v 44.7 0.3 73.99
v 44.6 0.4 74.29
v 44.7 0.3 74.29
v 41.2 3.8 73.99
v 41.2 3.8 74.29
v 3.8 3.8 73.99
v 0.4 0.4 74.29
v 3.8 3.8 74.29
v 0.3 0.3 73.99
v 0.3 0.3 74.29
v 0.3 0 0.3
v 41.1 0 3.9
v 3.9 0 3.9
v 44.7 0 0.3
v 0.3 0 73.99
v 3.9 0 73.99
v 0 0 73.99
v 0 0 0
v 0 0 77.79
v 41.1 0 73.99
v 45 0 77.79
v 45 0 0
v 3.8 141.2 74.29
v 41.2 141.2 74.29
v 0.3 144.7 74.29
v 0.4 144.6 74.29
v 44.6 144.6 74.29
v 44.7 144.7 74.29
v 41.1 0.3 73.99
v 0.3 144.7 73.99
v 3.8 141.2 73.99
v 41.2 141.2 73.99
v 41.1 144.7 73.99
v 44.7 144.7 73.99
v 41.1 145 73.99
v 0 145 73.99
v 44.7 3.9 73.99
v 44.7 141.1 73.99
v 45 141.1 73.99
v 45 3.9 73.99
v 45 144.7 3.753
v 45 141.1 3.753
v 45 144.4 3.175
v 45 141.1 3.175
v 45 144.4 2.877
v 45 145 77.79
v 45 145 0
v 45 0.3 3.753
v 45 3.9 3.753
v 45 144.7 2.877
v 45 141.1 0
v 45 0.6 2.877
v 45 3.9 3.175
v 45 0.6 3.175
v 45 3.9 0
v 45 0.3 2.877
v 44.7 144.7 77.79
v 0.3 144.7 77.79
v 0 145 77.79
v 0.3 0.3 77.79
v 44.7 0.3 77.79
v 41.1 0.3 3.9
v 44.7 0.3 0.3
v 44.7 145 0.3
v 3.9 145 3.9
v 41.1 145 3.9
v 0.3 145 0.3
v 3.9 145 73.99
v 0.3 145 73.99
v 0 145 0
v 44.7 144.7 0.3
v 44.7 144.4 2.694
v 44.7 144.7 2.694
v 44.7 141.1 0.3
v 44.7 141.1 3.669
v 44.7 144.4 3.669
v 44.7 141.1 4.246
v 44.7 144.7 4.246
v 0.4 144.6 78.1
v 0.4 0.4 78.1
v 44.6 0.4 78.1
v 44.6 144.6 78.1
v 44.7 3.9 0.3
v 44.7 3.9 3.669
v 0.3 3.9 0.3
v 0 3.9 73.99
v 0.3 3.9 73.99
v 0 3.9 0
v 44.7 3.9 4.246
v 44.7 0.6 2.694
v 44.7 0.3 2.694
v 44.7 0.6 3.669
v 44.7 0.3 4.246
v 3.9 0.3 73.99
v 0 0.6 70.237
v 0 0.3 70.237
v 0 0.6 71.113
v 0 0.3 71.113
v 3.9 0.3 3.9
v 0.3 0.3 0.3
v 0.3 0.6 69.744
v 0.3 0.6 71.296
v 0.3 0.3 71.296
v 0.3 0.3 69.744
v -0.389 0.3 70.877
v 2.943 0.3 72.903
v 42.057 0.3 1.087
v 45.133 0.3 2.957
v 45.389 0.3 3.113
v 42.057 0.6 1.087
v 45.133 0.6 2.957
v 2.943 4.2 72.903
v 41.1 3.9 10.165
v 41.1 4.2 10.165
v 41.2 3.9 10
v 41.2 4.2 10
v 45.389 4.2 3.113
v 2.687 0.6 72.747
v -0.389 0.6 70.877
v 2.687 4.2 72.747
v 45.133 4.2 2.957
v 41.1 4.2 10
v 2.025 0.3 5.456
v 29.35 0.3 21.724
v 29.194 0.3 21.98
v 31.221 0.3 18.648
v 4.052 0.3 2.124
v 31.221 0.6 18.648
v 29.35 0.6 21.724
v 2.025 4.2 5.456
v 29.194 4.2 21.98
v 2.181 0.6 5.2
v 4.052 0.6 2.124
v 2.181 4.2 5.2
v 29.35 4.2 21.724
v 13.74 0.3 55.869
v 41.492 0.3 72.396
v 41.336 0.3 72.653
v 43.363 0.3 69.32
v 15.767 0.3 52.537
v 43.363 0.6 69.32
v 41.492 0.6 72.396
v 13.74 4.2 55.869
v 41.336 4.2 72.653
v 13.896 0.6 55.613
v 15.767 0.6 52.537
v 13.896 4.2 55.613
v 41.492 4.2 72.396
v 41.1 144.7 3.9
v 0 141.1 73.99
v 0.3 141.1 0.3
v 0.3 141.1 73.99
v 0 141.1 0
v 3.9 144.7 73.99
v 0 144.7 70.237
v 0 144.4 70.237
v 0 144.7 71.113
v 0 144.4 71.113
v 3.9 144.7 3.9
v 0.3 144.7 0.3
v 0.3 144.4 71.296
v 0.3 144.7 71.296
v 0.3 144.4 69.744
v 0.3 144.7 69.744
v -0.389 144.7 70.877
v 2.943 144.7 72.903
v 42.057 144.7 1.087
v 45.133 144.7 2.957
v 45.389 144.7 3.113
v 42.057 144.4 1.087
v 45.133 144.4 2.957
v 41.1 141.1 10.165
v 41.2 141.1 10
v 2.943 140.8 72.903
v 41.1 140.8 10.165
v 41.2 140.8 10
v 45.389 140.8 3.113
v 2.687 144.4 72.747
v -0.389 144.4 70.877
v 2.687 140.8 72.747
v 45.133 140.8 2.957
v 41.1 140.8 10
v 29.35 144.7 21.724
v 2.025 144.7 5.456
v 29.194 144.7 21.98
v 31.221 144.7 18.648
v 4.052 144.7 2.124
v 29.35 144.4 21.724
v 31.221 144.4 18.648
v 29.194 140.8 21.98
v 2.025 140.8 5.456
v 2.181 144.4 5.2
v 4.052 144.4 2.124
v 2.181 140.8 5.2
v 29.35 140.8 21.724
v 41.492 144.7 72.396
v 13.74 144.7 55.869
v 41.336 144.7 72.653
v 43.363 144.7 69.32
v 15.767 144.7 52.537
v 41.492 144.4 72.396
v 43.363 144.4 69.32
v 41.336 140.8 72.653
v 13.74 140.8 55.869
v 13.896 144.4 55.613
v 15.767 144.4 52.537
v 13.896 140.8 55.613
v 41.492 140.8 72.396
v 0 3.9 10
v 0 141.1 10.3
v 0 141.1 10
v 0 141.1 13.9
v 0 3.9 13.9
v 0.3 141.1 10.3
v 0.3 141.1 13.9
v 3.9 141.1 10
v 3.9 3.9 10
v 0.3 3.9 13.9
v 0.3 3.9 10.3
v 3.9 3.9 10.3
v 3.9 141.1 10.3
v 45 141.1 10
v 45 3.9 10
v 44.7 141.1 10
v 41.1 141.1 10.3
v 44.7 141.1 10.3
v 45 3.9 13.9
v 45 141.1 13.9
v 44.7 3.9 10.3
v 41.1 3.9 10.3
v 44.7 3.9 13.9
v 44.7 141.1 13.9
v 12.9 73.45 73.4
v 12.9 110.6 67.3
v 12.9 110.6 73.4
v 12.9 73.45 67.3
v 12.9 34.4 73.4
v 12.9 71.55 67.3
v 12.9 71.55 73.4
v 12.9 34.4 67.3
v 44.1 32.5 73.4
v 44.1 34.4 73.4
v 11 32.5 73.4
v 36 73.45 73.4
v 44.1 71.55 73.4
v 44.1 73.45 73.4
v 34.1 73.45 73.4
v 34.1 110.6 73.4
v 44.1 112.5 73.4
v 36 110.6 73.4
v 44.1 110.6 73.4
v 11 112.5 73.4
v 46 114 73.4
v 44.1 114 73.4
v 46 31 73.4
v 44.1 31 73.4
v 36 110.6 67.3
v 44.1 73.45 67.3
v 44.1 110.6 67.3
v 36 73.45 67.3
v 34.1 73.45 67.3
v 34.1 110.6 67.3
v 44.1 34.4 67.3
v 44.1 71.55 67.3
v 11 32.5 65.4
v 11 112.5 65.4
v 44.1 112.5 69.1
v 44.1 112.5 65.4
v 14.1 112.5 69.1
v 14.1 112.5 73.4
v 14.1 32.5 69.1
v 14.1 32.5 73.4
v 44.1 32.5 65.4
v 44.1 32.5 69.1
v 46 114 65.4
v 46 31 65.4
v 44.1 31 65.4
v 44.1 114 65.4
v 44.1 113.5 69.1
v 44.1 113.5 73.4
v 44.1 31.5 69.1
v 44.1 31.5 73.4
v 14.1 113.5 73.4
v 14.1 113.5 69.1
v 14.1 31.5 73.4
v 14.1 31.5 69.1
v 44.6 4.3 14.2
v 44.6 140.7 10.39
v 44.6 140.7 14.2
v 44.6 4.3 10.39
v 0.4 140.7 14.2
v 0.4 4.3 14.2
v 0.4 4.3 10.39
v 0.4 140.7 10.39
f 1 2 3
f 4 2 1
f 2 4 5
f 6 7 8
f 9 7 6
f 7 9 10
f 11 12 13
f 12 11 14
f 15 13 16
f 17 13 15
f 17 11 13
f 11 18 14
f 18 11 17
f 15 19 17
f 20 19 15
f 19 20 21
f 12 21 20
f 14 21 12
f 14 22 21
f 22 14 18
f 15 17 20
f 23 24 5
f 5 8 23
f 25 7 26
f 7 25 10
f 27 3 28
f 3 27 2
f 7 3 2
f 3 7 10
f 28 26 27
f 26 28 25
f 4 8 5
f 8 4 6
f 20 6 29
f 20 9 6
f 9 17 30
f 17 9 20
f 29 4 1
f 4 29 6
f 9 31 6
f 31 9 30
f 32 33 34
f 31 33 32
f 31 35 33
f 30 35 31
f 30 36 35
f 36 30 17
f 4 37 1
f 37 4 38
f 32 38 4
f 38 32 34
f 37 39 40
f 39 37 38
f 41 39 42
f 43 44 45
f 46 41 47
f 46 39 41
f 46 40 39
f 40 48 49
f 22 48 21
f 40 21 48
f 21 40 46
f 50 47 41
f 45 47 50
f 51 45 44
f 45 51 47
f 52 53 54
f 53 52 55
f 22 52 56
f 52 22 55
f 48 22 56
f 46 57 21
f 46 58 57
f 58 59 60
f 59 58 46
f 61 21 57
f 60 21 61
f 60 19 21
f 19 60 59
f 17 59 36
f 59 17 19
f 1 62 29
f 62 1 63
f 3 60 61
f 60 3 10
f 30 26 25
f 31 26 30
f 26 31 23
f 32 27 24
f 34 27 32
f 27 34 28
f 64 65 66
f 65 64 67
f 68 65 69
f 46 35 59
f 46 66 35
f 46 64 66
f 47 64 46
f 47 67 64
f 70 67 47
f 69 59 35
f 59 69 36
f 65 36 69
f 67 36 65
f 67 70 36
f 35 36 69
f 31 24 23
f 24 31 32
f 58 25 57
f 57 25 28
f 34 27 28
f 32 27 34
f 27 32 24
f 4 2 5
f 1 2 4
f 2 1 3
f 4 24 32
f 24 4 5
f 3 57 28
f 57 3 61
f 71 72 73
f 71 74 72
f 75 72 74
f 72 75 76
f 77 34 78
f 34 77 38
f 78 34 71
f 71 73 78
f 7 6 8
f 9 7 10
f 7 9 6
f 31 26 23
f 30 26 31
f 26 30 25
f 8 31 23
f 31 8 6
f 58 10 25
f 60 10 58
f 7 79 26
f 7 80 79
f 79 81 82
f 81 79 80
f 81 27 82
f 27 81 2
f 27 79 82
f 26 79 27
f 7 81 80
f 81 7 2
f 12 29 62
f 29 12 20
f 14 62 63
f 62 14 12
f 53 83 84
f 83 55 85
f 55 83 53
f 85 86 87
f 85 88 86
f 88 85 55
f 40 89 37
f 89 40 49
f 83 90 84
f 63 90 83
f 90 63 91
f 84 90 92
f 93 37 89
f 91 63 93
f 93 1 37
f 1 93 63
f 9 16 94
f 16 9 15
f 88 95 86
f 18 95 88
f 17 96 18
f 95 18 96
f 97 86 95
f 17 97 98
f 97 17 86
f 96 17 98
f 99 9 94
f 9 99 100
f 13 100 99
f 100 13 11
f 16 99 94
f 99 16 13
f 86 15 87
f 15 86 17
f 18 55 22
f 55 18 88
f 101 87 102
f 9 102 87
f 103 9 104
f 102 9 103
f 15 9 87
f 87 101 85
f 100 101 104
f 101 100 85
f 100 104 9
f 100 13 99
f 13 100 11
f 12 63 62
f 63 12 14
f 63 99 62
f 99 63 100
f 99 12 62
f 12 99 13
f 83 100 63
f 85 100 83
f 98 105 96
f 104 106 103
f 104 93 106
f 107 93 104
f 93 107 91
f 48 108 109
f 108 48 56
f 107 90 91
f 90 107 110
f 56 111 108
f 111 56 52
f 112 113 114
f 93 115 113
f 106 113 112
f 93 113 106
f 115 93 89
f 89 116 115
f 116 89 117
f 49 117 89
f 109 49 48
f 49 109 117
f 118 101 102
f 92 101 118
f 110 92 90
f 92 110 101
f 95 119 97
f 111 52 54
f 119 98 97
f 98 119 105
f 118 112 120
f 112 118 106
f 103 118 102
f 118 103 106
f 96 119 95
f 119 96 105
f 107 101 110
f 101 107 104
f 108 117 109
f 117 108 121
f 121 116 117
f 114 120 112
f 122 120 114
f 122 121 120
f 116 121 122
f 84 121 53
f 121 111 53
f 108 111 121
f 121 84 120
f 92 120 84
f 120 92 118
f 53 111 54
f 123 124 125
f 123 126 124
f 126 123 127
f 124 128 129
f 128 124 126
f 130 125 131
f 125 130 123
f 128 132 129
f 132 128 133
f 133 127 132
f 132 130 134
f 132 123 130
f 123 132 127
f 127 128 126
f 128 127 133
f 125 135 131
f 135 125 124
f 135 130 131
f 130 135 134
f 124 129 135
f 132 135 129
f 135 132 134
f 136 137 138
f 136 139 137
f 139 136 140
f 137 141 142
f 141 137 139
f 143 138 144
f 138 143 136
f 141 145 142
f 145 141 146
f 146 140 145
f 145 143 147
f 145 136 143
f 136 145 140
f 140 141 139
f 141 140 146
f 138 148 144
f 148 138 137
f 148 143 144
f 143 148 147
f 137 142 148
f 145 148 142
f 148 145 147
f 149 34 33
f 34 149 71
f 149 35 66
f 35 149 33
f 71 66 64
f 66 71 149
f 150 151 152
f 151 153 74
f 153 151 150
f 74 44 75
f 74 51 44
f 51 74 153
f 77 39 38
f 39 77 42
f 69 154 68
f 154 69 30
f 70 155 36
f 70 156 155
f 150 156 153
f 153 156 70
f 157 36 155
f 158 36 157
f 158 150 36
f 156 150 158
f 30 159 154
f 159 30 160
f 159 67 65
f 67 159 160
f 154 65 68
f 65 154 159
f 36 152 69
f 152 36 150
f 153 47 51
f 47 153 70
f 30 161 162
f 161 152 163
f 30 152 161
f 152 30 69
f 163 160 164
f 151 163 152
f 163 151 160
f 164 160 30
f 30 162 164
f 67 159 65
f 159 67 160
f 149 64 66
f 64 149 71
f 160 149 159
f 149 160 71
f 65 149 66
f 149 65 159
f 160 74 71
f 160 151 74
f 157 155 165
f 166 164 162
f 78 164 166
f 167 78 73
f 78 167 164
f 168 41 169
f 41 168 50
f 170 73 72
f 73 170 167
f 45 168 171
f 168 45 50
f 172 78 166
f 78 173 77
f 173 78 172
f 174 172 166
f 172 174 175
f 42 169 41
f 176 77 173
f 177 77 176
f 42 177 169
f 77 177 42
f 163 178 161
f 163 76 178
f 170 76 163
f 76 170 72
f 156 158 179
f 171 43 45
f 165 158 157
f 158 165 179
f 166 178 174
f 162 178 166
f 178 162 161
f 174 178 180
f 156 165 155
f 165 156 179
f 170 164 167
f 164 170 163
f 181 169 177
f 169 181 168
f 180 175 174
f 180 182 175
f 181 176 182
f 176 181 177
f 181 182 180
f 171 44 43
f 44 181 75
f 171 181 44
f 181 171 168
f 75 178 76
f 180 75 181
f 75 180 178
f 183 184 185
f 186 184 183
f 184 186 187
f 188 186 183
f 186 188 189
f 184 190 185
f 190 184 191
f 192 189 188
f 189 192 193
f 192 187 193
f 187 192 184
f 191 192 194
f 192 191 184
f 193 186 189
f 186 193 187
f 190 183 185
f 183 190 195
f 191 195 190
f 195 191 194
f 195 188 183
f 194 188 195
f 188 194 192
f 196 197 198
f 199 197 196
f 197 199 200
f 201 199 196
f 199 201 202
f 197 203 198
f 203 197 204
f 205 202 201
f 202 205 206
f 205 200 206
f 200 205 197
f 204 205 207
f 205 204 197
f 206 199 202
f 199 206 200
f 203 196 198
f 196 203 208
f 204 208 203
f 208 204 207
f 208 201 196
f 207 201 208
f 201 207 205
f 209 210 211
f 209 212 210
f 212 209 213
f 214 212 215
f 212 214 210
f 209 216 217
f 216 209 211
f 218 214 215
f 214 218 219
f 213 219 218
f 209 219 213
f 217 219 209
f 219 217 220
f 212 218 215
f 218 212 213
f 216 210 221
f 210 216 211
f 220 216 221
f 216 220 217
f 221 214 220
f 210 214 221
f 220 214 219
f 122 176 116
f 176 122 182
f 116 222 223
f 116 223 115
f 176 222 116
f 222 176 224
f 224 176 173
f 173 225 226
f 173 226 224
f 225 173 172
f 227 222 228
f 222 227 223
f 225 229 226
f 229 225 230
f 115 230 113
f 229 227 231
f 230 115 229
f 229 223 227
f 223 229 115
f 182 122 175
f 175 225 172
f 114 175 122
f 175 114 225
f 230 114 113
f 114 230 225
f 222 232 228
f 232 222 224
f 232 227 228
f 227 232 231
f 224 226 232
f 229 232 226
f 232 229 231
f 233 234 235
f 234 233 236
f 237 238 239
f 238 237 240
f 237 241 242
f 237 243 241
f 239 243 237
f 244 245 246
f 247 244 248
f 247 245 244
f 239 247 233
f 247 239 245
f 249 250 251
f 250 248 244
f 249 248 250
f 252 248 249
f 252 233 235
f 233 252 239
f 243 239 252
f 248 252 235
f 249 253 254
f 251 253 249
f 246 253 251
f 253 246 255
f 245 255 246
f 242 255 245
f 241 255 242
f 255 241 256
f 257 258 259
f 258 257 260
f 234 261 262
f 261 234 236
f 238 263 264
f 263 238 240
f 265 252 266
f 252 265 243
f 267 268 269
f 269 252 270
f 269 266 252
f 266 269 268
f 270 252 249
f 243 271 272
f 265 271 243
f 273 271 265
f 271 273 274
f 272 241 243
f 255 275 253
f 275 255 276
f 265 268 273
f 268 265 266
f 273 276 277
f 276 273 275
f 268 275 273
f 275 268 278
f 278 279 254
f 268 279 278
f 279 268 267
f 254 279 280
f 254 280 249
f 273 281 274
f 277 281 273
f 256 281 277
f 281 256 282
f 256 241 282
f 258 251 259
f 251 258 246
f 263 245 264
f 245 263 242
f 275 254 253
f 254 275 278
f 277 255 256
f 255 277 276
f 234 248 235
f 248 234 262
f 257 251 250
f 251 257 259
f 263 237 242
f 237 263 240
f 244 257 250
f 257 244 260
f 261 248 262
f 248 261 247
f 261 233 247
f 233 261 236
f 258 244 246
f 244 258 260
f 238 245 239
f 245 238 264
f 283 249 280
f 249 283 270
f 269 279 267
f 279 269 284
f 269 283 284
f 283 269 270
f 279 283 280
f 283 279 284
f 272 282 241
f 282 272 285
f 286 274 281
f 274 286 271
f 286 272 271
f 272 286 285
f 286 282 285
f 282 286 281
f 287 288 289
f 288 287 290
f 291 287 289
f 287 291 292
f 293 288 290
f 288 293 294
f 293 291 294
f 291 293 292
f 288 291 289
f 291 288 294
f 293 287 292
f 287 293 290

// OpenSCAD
// file: ../hdim.scad
module hdim(x1 = 10, x2 = 20, y = 10, dimline_lenght = 9.0) 
{
    dimline_overlap = 0.5;
    dimline_width = 0.3;
    text_size = 2;
    tmp = 2*dimline_overlap+text_size/2;
    text_pos = dimline_lenght>0 ? tmp : -tmp; 
    dimline_abs = dimline_lenght>0 ? dimline_lenght : -dimline_lenght;
    
    color([0,0,0])
    {
        translate([x1,y-dimline_lenght/2,0]) 
            square([dimline_width, 
                dimline_abs + 2*dimline_overlap], 
                center=true, $fs=0.01);
                
        translate([x2,y-dimline_lenght/2,0]) 
            square([dimline_width, 
                dimline_abs + 2*dimline_overlap], 
                center=true, $fs=0.01);

        translate([(x1+x2)/2,y-dimline_lenght,0]) 
            square([x2-x1, 
                dimline_width], 
                center=true, $fs=0.01);
    }
        
    translate([(x1+x2)/2,y-dimline_lenght-text_pos,0]) 
    {
        color([0,0,0])
        cube([text_size * 5, 1.2*text_size, 0.9], center=true);
        
        color([0.8,0.8,0.5,1.0])
        {
            translate([0,0,0.2])
            text(str(0.1*round((x2-x1)*10)), size = text_size, 
                halign = "center",valign = "center");
            translate([0,0,-0.2])
            rotate([0,180,0])
            text(str(0.1*round((x2-x1)*10)), size = text_size, 
                halign = "center",valign = "center");
        }
    }
}

hdim();
// file: printershelfdrawer.scad
use <../hdim.scad> 

box_l = 35; // Depth max 54
box_w = 80; 
box_h = 8;
plywood_t = 1.9;

slider_t = 1; // thickness
slider_w = 4.3; // width
slider_l = 30; // length
slider_m = slider_l; // movement

module printershelfdrawer(open = false)
{
  explode = false;
  final_view = false;
  
  edelta = explode ? 12 : 0;
  opaque10 = final_view ? 0 : 0.1;
    
  translate([open?slider_m:0,0,0])
  {  
    color([51/255, 34/255, 6/255, 1-opaque10]) 
    translate([-plywood_t/2,0,plywood_t/2])
    cube([box_l-plywood_t, box_w, plywood_t], center=true);
    
    if (!final_view) {
        hdim(-box_l/2, box_l/2-plywood_t, box_w/2, -2);
        rotate([0,0,90]) 
        hdim(-box_w/2, box_w/2, box_l/2, -5);
    }

    cover_over = 1.5;
    
    color([121/255, 44/255, 16/255, 1-2*opaque10]) {
        translate([-box_l/2+plywood_t/2-edelta,0,box_h/2+plywood_t/2])
        cube([plywood_t, box_w, box_h-plywood_t],
            center=true);
        
        translate([box_l/2-plywood_t/2+edelta,0,box_h/2])
        cube([plywood_t, box_w+2*cover_over, box_h],
            center=true); 
    }

    dim1 = (box_l - 2*plywood_t)/2;
    dim2 = (box_h - plywood_t)/2;
    dim3 = box_h/2;

    if (!final_view) {
        translate([0, -edelta, box_h/2+plywood_t/2]) 
        rotate([0,0,180]) 
        hdim(-dim1, dim1, box_w/2, -5);
        
        translate([0, -edelta-box_w/2+plywood_t/2,
            box_h/2+plywood_t/2]) 
        rotate([0,90,90]) 
        hdim(-dim2, dim2, -dim1, 5);
    }
    
    color([91/255, 78/255, 66/255, 1-2*opaque10]) {
        translate([0,box_w/2-plywood_t/2+edelta,
            box_h/2+plywood_t/2])
        cube([box_l - 2*plywood_t, plywood_t,
            box_h-plywood_t], center=true);
        
        translate([0,-box_w/2+plywood_t/2-edelta,
            box_h/2+plywood_t/2])
        cube([box_l - 2*plywood_t, plywood_t, 
            box_h-plywood_t], center=true);
    }
    
    if (!final_view) {
        translate([0,0,box_h/2+plywood_t/2])
        rotate([0,0,90]) 
        hdim(-box_w/2-cover_over, 
            box_w/2+cover_over, 
            -box_l/2-edelta, 7); 
        
        translate([edelta+box_l/2-plywood_t/2,
        0, box_h/2]) 
        rotate([0,90,-90]) hdim(-dim3, dim3, 0, -4);
    }
 
    main_divider_pos = 10;
    color([91/255, 44/255, 16/255, 1-2*opaque10]) 
    {
        ww = box_w/2 - 1.5 * plywood_t;
      translate([box_l/2 - plywood_t/2
        + edelta - main_divider_pos,
        ww/2+plywood_t/2,box_h/2+plywood_t/2])
      cube([plywood_t, ww, 
        box_h-plywood_t], center=true);
            
      translate([0,0,
            box_h/2+plywood_t/2])
      cube([box_l - 2*plywood_t, plywood_t, 
            box_h-plywood_t], center=true);

      }
    
    translate([-slider_l + box_l/2 - plywood_t, 
        box_w/2, box_h-slider_w]) 
    slider(open);
    
    translate([-slider_l + box_l/2 - plywood_t, 
        -box_w/2, box_h-slider_w]) 
    mirror([0,1,0]) 
    slider(open);
  }
}        

module slider(open = false)
{
    color([122/255, 162/255, 214/255, 1]) 
    cube([slider_l, slider_t/2, slider_w], center = false);

    translate([open?-slider_m:0,slider_t/2,0])
    color([192/255, 192/255, 255/255, 1]) 
    cube([slider_l, slider_t/2, slider_w], center = false);}



printershelfdrawer();
// file: tableleg.scad
use <../hdim.scad> 


bar_t  = 0.3;

module tableleg(height = 73.9, width = 56, bar_diam = 3.8, dimensions=true, explode=false, c1 = [0.5,0.28,0.19, 1.0], c2 = [0.8,0.30,0.29, 1.0])
{
    d = explode ? 20 : 0;
   
    
    translate([width,0,0])
    rotate([0,90,90])
    {
    translate([-height,-d,0]) 
    tl_anglebar(height, bar_diam, c1, straight1=true, dims=dimensions);
    translate([0,width+d,0]) 
    rotate([0,0,180])
    tl_anglebar(height, bar_diam, c1, straight2=true, dims=dimensions);
    translate([d,0,0]) 
    rotate([0,0,90])
    tl_anglebar(width, bar_diam, c2, dims=dimensions);
    angle = atan2(width, height);
    len = sqrt(width*width+height*height) - (bar_diam+bar_t)/cos(angle);
    translate([-height/2,width/2,bar_t]) 
    rotate([0,0,-angle])
    translate([-len/2,-bar_diam/2,0]) 
    tl_anglebar(len, bar_diam, c2, straight1=true, straight2=true, dims=dimensions);

    
    hyp = width - 1.41*bar_diam;
    angle2 = -angle+90;
    cat1 = sin(angle)*hyp;
    cat2 = cos(angle)*hyp;
    len2 = cat2 - bar_diam/2;
    
    dx = cat1*cos(angle);
    dy = cat1*sin(angle)+1.25*bar_diam/2;
    translate([-dx,dy,bar_t]) 
    rotate([0,0, angle2])
    translate([len2,4*bar_diam/3,0]) 
    rotate([0,0,180])
    tl_anglebar(len2, bar_diam, c2, straight1=true, straight2=true, dims=dimensions);

    dx2 = height-dx-bar_diam/2-bar_t;
    dy2 = width-dy-bar_diam/2+bar_t;
    translate([-dx2,dy2,bar_t]) 
    rotate([0,0, angle2])
    translate([0,bar_diam/2,0]) 
     rotate([0,0,180])
    tl_anglebar(len2+0.5,bar_diam, c2,straight1=true, straight2=true, dims=dimensions);
    }
}        

module tl_anglebar(height, bar_diam, c, straight1=false, straight2=false, dims=true)
{
   color(c)
    {
        linear_extrude(bar_t) 
        polygon(points=[[0,0],
            [straight1?0:bar_diam, bar_diam],
            [straight2?height:height-bar_diam, bar_diam],
            [height, 0], [0,0]]);
 
        cube([height, bar_t, bar_diam]);
    }
    
    if (dims) {
        hdim(x1 = 0, x2 = height, y = 0, dimline_lenght = 5);
    }
}   


tableleg();
// file: ../simpleplaywood.scad
module simpleplaywood(length=57, width = 210, spacing = 0.5, playwood_thickness = 0.75 * 2.54, c = [0.80,0.43,0.32]) 
{
    translate([length/2+spacing,width/2+spacing,-playwood_thickness/2])
    color(c)
    cube([length-2*spacing, width-2*spacing, playwood_thickness],center=true);
    
 
}

simpleplaywood();
// file: ../anglebarframe.scad
use <hdim.scad> 

bar_diam = 3.8;
bar_t  = 0.3;

module anglebarframe(length = 60, width = 210, explode=false, c1 = [0.5,0.28,0.19, 1.0], c2 = [0.8,0.30,0.29, 1.0])
{
    d = explode ? 20 : 0;
      
    rotate([0,180,0])
    {
    translate([-length,-d,0]) 
    anglebar(length, c1);
    translate([0,width+d,0]) 
    rotate([0,0,180])
    anglebar(length, c1);
    translate([d,0,0]) 
    rotate([0,0,90])
    anglebar(width, c2);
    translate([-length-d,width,0]) 
    rotate([0,0,-90])
    anglebar(width,c2);
    }
}        

module anglebar(length, c)
{
   color(c)
    {
        linear_extrude(bar_t) 
        polygon(points=[[0,0],
            [bar_diam, bar_diam],
            [length-bar_diam, bar_diam],
            [length, 0], [0,0]]);
 
        cube([length, bar_t, bar_diam]);
    }
}   


anglebarframe();
// main file
use <../anglebarframe.scad>
use <../simpleplaywood.scad>
use <tableleg.scad>
use <printershelfdrawer.scad>

playwood_thickness = 2 * 0.75 * 2.54;
bar_diam = 3.9;

c = [0.3,0.3,0.39, 1.0];
c2 = [0.3,0.30,0.50, 1.0];
   
plywood_c = [0.80,0.43,0.32, 0.7];

module printershelf(width = 145, depth = 45, height = 77.8, explode=false)
{
    anglebar_thickness = 0.3;
    playwood_allowance = 0.1 + anglebar_thickness; // Needs to include 0.3 mm for angle bar
 
    translate([depth,0,height-playwood_thickness])
    rotate([0,180,0])
    {
    anglebarframe(depth, width, explode, c, c2);
    
    translate([-playwood_allowance,-playwood_allowance,-anglebar_thickness])
    simpleplaywood(depth, width, playwood_allowance, playwood_thickness,plywood_c);
    }
    
    text_size = 4;
    row_step = 7;
    ystart = width - row_step;
    
    color([0.9,0.9,0.1,1.0])
    {
        t1 = "PRINTER SHELF"; 
        t2 = str(width, "cm x ", depth, "cm");
        t3 = "plywood size";
        t4 = str(width-2*playwood_allowance, " x ", depth-2*playwood_allowance);
     
        translate([depth/2,ystart,height]) 
        {
            text(t1, size = text_size, 
                halign = "center",valign = "top");
            translate([0, -8, 0]) 
                text(t2, size = text_size, 
                    halign = "center",valign = "top");
            translate([0, -width/2, 0]) 
                text(t3, size = text_size, 
                    halign = "center",valign = "top");
            translate([0, -width/2-8, 0]) 
                text(t4, size = text_size, 
                    halign = "center",valign = "top");
        }
    } 
    
    tableleg(height-playwood_thickness, depth, bar_diam, true, explode, c, c2);
    
    translate([0, width, 0])
    mirror([0,1,0])
    tableleg(height-playwood_thickness, depth, bar_diam, false, explode, c, c2);
    
    space_for_vacuum_cleaner = 10;
    translate([0, bar_diam, space_for_vacuum_cleaner])
    rotate([90,0,90])
    tl_anglebar(width-2*bar_diam, bar_diam, c, straight1=true, straight2=true); 

    translate([depth, bar_diam, space_for_vacuum_cleaner])
    rotate([0,0,90])
    tl_anglebar(width-2*bar_diam, bar_diam, c, straight1=true, straight2=true); 
    
    translate([-playwood_allowance,-playwood_allowance+bar_diam,anglebar_thickness+space_for_vacuum_cleaner+bar_diam])
    simpleplaywood(depth, width-2*bar_diam, playwood_allowance, playwood_thickness);
    
    color([0.9,0.9,0.1,1.0])
    {
        t3 = "plywood size";
        t4 = str(width-2*bar_diam-2*playwood_allowance, " x ", depth-2*playwood_allowance);
     
        translate([depth/2,ystart,anglebar_thickness+space_for_vacuum_cleaner+bar_diam]) 
        {
            translate([0, -width/2, 0]) 
                text(t3, size = text_size, 
                    halign = "center",valign = "top");
            translate([0, -width/2-8, 0]) 
                text(t4, size = text_size, 
                    halign = "center",valign = "top");
        }
    } 

   
    translate([depth/2+6, width/2, height-bar_diam-8.5])
    printershelfdrawer(false);
}        

printershelf();
